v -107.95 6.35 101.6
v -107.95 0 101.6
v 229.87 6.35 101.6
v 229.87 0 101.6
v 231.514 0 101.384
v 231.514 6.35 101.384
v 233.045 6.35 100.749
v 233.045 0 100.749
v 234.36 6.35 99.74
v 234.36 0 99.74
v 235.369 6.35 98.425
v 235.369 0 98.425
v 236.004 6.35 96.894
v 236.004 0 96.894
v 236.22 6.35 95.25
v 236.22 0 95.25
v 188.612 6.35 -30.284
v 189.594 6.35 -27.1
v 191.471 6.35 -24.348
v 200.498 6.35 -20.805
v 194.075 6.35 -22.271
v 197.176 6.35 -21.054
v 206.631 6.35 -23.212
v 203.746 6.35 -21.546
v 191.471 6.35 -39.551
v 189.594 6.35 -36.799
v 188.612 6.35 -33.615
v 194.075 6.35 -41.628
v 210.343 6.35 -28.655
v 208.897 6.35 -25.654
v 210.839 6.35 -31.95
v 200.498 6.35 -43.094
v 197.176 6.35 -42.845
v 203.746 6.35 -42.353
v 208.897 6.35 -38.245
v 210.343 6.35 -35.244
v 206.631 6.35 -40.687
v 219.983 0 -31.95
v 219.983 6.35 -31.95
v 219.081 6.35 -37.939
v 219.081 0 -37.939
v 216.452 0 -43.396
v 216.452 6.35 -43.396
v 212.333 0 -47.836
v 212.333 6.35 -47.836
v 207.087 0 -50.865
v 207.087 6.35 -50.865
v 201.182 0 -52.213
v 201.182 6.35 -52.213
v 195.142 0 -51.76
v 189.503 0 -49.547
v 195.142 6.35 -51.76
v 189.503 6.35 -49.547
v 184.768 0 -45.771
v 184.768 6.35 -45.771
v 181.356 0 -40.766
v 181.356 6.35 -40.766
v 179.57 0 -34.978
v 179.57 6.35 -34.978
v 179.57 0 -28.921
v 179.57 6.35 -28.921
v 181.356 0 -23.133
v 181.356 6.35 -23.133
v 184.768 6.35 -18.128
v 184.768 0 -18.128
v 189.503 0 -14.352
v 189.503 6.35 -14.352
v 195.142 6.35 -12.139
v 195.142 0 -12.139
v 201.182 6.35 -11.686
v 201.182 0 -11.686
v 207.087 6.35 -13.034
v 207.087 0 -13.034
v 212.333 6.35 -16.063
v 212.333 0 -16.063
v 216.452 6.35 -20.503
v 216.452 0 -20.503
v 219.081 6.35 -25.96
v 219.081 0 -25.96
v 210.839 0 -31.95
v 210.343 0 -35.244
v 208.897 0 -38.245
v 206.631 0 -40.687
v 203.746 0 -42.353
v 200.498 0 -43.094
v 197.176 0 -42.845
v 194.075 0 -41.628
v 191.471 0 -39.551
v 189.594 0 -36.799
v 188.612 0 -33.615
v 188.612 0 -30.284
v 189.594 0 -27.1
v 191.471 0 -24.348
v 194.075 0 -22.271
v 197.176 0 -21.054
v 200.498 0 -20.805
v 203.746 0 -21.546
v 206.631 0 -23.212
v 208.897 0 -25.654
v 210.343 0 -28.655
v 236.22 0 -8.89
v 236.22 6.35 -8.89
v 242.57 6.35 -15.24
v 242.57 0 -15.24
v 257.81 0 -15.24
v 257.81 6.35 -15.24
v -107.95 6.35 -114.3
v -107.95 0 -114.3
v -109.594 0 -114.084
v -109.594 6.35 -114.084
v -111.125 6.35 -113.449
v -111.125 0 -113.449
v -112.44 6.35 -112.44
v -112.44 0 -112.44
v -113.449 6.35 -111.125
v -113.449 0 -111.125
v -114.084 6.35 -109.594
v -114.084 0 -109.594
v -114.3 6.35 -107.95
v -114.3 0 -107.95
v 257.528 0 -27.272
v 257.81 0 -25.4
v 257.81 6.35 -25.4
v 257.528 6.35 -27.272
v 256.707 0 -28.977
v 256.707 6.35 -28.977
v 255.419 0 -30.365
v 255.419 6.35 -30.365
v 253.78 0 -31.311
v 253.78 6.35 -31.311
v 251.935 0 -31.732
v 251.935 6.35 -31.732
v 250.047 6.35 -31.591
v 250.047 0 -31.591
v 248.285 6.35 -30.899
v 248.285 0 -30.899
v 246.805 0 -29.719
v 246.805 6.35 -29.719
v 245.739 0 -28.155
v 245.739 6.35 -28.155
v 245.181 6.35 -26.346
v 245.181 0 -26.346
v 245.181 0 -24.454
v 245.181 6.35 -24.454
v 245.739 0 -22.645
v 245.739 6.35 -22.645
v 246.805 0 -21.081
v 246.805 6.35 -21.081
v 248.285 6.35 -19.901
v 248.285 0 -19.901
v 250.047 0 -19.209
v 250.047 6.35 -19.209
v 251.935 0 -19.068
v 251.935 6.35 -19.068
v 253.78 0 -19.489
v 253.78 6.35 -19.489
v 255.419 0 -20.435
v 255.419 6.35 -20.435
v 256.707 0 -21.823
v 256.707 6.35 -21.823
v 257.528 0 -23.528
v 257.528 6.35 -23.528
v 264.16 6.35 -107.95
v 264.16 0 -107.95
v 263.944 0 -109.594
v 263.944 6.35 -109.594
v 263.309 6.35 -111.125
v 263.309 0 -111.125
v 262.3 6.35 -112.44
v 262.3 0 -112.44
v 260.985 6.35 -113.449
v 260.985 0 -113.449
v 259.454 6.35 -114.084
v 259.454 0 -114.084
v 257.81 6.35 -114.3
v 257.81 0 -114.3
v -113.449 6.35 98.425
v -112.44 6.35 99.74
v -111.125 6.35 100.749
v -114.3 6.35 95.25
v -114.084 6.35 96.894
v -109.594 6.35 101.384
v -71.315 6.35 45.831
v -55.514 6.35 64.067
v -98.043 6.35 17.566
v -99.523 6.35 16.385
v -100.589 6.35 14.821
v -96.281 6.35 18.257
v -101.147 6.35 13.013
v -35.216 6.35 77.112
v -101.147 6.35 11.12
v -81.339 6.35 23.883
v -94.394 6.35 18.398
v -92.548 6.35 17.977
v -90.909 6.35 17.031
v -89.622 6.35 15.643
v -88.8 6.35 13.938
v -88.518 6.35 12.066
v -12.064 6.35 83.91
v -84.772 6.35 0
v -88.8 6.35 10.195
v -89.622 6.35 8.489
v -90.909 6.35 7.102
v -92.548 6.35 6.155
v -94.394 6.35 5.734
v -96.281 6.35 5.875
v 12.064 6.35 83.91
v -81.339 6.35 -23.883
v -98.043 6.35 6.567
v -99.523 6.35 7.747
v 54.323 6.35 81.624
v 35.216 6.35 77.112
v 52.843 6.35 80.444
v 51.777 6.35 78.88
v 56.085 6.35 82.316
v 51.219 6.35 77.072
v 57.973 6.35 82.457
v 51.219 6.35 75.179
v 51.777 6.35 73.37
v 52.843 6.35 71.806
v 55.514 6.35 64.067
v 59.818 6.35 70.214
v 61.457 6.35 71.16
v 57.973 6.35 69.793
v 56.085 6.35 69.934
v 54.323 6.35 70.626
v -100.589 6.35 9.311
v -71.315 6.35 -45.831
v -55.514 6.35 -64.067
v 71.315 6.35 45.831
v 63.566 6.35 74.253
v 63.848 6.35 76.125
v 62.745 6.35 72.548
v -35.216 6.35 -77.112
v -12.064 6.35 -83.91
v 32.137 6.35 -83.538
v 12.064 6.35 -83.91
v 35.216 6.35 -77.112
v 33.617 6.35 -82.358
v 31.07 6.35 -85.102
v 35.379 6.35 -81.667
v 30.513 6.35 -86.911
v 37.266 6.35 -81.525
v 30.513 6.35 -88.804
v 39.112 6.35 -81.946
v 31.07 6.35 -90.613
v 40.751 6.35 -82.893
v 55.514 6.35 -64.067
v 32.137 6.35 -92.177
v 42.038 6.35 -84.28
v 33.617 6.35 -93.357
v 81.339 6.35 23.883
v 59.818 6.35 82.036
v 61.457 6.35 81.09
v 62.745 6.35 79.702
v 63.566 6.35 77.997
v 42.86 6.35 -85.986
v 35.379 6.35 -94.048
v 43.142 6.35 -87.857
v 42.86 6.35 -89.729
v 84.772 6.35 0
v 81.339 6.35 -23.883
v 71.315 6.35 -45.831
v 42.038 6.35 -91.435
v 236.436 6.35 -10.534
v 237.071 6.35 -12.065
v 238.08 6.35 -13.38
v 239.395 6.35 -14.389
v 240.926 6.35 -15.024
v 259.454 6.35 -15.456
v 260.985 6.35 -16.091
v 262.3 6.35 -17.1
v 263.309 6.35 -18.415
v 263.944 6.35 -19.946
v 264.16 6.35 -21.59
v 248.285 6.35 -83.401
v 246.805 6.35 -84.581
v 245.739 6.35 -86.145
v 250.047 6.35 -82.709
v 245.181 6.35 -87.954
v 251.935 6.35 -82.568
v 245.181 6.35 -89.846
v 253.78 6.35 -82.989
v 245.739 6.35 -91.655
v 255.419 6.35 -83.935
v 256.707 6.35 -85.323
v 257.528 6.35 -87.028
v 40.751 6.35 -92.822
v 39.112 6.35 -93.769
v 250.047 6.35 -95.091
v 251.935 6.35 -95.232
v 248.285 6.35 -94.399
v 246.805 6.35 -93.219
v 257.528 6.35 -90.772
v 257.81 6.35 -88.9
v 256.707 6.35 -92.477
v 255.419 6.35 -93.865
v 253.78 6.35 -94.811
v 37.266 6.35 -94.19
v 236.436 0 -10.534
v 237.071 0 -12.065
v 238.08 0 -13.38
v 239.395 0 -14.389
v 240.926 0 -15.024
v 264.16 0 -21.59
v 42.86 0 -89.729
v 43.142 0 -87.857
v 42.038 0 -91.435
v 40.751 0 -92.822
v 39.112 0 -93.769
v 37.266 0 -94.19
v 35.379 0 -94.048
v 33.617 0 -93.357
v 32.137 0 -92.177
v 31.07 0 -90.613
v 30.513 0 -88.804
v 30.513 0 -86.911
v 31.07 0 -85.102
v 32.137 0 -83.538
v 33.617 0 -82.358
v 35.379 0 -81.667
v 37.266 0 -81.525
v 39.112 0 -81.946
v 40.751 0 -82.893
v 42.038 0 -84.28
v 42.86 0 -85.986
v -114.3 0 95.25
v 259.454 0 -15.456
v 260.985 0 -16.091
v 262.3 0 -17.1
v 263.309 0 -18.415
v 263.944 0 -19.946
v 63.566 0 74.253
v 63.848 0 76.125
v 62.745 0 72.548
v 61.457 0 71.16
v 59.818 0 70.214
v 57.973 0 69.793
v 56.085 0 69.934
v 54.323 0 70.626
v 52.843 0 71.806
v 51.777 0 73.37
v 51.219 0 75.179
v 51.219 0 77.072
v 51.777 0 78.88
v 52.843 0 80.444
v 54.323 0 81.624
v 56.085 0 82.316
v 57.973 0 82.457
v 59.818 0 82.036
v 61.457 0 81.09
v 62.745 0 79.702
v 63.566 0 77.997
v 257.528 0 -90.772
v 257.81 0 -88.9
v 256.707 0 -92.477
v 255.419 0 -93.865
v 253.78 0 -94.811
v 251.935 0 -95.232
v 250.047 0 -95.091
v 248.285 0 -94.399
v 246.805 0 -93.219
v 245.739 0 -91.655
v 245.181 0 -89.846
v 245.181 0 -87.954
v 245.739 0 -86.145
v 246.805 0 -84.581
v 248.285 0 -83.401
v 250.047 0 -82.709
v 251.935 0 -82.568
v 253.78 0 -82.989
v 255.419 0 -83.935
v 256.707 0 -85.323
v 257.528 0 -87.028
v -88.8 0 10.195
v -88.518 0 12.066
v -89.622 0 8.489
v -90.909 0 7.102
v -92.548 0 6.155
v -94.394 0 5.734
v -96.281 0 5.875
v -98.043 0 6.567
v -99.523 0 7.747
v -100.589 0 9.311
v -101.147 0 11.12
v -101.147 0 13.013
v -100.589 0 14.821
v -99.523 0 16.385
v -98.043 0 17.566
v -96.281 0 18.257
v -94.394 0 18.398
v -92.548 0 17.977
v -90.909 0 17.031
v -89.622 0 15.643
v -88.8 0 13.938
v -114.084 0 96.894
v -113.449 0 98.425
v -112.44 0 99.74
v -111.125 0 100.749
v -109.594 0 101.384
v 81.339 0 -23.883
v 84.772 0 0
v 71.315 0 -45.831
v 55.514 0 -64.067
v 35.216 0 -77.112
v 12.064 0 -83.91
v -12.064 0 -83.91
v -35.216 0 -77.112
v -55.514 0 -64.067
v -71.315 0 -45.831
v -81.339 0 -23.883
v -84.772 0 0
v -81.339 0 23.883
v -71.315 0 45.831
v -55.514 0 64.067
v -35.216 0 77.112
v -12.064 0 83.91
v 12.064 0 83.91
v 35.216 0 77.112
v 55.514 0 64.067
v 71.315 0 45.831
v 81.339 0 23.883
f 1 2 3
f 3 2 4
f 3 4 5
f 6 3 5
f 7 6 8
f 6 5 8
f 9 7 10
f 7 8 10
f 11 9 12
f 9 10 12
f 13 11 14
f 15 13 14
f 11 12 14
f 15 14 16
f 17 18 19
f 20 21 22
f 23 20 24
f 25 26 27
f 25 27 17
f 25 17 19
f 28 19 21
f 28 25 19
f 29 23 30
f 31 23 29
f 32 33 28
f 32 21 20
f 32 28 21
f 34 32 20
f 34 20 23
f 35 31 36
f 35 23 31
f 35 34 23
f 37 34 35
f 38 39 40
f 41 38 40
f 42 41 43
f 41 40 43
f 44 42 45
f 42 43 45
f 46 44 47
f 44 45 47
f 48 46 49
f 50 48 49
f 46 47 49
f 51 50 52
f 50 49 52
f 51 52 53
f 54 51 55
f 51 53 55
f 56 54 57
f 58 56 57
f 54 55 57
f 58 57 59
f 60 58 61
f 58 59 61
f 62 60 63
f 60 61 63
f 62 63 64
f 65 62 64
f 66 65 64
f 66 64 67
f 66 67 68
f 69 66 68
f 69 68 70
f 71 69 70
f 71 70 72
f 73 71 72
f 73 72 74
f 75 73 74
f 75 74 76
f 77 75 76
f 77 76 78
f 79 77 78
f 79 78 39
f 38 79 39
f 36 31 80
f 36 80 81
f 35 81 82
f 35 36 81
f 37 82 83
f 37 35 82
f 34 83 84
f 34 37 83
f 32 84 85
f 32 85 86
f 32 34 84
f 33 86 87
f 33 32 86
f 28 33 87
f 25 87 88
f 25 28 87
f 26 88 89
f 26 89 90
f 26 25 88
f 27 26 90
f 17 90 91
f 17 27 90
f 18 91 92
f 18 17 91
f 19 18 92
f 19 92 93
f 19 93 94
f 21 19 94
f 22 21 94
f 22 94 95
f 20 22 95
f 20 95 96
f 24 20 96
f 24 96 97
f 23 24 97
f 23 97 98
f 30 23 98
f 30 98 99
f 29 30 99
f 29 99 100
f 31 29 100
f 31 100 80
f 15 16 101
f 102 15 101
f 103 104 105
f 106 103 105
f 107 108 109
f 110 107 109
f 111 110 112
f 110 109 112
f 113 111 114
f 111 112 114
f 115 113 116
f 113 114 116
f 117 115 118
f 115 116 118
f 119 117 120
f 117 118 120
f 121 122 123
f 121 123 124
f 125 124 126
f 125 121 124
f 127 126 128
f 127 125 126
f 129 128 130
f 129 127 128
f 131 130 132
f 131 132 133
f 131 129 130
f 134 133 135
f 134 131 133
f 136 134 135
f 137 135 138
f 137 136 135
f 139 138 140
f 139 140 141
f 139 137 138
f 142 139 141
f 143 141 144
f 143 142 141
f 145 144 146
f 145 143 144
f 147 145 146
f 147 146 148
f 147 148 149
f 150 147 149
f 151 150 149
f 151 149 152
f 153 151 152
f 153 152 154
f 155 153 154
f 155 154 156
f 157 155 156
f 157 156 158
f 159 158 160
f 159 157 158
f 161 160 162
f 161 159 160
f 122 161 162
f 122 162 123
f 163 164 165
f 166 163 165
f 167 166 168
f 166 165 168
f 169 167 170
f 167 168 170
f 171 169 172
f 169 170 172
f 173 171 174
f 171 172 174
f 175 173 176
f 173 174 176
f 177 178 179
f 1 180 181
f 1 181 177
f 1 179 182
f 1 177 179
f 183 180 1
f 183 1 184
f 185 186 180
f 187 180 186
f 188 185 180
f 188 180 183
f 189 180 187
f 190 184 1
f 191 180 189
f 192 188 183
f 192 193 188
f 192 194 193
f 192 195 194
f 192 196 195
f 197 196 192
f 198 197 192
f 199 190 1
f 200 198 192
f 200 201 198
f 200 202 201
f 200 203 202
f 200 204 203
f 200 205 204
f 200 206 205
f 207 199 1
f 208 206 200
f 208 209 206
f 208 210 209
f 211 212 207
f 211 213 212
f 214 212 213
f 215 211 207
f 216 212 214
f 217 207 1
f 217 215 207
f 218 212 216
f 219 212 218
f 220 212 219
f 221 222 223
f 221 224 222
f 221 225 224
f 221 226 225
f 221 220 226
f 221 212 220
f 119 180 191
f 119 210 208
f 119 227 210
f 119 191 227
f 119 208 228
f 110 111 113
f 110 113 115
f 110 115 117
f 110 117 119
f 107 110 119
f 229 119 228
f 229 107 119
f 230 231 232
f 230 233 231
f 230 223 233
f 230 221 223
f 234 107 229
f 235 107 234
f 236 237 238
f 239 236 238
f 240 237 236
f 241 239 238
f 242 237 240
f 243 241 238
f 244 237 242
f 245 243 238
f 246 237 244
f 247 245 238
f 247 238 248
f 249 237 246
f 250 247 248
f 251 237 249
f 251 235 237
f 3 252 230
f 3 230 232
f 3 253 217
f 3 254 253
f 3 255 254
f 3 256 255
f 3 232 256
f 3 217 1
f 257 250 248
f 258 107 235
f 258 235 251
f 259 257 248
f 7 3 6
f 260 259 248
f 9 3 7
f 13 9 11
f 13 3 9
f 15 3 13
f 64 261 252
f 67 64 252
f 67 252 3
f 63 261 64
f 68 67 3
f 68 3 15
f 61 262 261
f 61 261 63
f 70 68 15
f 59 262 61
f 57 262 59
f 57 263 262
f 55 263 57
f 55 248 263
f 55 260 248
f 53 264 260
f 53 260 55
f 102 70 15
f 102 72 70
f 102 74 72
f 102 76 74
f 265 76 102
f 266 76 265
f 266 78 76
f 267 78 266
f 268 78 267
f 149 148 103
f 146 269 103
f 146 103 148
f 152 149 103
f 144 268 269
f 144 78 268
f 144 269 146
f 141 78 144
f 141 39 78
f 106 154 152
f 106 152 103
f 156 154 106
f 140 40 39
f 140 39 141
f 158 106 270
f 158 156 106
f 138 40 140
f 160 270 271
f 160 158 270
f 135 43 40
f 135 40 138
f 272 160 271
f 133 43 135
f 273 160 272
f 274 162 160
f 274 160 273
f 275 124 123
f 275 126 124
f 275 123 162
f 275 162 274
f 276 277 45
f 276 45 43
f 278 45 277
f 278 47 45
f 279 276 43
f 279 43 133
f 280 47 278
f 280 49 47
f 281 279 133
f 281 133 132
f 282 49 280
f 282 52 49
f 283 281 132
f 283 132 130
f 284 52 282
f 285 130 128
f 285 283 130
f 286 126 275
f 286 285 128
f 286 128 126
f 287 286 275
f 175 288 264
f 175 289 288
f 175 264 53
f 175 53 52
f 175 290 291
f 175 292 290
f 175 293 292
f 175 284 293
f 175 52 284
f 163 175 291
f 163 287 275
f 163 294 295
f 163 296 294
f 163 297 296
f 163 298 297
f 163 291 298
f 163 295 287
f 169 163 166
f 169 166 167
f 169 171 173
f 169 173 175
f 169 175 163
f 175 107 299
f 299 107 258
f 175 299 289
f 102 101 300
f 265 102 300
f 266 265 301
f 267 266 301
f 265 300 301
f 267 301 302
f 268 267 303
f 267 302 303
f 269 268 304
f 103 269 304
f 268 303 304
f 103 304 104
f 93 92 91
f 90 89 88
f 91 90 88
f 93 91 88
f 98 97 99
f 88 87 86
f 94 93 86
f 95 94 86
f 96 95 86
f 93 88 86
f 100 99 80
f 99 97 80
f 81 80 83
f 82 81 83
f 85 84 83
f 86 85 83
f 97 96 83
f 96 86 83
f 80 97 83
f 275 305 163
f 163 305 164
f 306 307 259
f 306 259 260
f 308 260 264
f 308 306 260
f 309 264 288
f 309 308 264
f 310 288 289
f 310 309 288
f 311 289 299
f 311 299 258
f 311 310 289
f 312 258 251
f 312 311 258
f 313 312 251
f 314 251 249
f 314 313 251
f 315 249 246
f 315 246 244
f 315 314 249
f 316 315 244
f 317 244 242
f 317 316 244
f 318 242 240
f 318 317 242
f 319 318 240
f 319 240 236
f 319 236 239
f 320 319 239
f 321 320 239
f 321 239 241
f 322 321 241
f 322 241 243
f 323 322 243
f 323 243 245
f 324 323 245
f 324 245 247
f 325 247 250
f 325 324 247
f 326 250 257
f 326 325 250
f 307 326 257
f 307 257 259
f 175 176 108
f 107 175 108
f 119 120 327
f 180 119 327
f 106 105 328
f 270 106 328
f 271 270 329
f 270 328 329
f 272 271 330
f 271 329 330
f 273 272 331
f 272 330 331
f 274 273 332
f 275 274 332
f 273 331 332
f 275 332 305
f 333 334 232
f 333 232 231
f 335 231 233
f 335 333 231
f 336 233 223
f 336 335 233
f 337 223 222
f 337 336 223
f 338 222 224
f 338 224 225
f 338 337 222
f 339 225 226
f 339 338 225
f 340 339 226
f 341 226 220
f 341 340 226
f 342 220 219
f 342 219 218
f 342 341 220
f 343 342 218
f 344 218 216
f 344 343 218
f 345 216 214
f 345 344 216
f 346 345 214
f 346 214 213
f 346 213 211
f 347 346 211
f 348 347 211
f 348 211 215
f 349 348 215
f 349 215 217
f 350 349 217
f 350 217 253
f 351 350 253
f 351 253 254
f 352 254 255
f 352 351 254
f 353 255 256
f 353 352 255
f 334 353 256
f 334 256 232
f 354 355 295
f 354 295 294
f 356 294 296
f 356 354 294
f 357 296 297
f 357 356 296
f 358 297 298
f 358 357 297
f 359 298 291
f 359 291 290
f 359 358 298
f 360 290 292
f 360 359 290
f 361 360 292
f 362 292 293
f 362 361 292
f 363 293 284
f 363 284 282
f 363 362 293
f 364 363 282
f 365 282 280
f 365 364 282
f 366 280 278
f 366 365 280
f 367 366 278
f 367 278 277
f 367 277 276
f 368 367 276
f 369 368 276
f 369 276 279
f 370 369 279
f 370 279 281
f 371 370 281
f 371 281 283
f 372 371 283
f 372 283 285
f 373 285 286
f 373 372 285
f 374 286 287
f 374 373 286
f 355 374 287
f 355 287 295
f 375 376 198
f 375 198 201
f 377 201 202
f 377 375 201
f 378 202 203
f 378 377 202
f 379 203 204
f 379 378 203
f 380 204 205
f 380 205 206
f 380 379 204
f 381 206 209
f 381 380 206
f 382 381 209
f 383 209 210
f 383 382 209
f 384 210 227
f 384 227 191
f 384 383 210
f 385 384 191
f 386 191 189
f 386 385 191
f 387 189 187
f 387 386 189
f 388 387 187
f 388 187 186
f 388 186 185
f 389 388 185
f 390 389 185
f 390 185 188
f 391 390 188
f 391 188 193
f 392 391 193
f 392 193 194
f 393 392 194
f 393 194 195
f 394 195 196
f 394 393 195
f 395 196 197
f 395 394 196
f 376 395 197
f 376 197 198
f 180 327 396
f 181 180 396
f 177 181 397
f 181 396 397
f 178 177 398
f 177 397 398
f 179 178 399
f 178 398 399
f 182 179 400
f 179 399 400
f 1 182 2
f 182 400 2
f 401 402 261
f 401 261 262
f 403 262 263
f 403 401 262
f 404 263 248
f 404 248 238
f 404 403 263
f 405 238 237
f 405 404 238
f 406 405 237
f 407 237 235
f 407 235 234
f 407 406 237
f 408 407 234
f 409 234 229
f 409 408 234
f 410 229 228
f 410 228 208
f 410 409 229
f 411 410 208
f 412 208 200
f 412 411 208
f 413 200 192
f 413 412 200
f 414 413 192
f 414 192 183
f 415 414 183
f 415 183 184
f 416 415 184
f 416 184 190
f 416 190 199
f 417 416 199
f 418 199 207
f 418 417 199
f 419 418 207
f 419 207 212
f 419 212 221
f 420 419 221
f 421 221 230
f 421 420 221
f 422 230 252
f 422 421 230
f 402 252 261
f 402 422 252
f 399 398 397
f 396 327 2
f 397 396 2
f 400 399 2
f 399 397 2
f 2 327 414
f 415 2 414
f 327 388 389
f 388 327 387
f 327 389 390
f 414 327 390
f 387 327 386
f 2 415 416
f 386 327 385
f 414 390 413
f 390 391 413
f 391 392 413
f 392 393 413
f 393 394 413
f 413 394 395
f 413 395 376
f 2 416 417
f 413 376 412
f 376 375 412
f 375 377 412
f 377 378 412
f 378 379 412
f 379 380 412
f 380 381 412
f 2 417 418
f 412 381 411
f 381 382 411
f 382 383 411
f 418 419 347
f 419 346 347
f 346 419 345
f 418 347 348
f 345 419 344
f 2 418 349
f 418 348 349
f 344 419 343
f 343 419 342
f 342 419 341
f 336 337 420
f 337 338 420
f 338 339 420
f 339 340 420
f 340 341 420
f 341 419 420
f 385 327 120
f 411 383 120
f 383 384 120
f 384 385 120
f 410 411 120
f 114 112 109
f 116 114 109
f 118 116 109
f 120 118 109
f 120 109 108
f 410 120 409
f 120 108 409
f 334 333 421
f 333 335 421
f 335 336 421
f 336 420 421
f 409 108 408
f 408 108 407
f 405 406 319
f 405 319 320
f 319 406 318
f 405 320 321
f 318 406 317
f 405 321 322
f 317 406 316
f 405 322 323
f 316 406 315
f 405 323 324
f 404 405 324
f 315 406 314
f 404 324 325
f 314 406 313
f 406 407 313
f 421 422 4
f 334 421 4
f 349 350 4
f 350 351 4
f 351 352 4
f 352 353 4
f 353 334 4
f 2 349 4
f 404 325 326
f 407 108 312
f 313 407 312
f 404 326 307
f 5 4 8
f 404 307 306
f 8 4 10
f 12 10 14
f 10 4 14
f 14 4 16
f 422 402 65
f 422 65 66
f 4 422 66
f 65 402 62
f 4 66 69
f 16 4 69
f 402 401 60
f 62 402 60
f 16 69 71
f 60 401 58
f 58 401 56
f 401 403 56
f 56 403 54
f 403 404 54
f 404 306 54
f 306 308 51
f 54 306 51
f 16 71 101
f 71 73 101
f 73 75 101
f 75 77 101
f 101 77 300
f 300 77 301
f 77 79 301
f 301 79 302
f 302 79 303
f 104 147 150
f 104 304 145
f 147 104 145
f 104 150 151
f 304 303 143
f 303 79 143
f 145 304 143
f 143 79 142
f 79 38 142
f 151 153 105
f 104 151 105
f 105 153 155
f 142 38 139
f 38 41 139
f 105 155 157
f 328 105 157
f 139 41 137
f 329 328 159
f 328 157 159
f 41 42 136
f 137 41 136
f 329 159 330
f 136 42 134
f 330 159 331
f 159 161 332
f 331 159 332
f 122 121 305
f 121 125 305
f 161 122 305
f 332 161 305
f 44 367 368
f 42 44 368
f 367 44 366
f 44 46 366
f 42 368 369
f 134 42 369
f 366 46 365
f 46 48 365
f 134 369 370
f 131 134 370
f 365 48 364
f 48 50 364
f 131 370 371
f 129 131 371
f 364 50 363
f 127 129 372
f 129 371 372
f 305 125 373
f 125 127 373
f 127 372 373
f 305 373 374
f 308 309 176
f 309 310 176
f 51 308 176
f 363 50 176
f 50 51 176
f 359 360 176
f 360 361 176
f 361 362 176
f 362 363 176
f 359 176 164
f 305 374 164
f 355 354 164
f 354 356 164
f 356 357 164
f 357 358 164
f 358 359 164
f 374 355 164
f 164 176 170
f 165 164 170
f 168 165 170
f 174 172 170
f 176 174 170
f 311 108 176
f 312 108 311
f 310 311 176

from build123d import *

# Parameters (mm, degrees)
SKETCH1_R           = 84.7725
SKETCH1_R_2         = 6.35
BOSS_EXTRUDE1_DEPTH = 6.35
SKETCH4_R           = 20.32
SKETCH4_R_2         = 11.176
CUT_EXTRUDE1_DEPTH  = 9.652


with BuildPart() as part:
    # Sketch1 → Boss-Extrude1 (new body)
    with BuildSketch(Plane(origin=(0, 0, 0), x_dir=(1, 0, 0), z_dir=(0, 1, 0))):
        with BuildLine():
            Line((257.81, 114.3), (-107.95, 114.3))
            ThreePointArc((-107.95, 114.3), (-112.440128061, 112.440128061), (-114.3, 107.95))
            Line((-114.3, 107.95), (-114.3, -95.25))
            ThreePointArc((-114.3, -95.25), (-112.440128061, -99.740128061), (-107.95, -101.6))
            Line((-107.95, -101.6), (229.87, -101.6))
            ThreePointArc((229.87, -101.6), (234.360128061, -99.740128061), (236.22, -95.25))
            Line((236.22, -95.25), (236.22, 8.89))
            ThreePointArc((236.22, 8.89), (238.079871939, 13.380128061), (242.57, 15.24))
            Line((242.57, 15.24), (257.81, 15.24))
            ThreePointArc((257.81, 15.24), (262.300128061, 17.099871939), (264.16, 21.59))
            Line((264.16, 21.59), (264.16, 107.95))
            ThreePointArc((264.16, 107.95), (262.300128061, 112.440128061), (257.81, 114.3))
        make_face()
        Circle(SKETCH1_R, mode=Mode.SUBTRACT)
        with Locations((-94.868167092, -12.066247058)):
            Circle(SKETCH1_R_2, mode=Mode.SUBTRACT)
        with Locations((36.791640664, 87.857485038)):
            Circle(SKETCH1_R_2, mode=Mode.SUBTRACT)
        with Locations((57.498227222, -76.125119184)):
            Circle(SKETCH1_R_2, mode=Mode.SUBTRACT)
        with Locations((251.46, 88.9)):
            Circle(SKETCH1_R_2, mode=Mode.SUBTRACT)
        with Locations((251.46, 25.4)):
            Circle(SKETCH1_R_2, mode=Mode.SUBTRACT)
    extrude(amount=BOSS_EXTRUDE1_DEPTH)

    # Sketch4 → Cut-Extrude1 (cut)
    with BuildSketch(Plane(origin=(0, 6.35, 0), x_dir=(1, 0, 0), z_dir=(0, 1, 0))):
        with Locations((199.663269189, 31.949583289)):
            Circle(SKETCH4_R)
        with Locations((199.663269189, 31.949583289)):
            Circle(SKETCH4_R_2, mode=Mode.SUBTRACT)
    extrude(amount=-CUT_EXTRUDE1_DEPTH, mode=Mode.SUBTRACT)


solid = part.part
